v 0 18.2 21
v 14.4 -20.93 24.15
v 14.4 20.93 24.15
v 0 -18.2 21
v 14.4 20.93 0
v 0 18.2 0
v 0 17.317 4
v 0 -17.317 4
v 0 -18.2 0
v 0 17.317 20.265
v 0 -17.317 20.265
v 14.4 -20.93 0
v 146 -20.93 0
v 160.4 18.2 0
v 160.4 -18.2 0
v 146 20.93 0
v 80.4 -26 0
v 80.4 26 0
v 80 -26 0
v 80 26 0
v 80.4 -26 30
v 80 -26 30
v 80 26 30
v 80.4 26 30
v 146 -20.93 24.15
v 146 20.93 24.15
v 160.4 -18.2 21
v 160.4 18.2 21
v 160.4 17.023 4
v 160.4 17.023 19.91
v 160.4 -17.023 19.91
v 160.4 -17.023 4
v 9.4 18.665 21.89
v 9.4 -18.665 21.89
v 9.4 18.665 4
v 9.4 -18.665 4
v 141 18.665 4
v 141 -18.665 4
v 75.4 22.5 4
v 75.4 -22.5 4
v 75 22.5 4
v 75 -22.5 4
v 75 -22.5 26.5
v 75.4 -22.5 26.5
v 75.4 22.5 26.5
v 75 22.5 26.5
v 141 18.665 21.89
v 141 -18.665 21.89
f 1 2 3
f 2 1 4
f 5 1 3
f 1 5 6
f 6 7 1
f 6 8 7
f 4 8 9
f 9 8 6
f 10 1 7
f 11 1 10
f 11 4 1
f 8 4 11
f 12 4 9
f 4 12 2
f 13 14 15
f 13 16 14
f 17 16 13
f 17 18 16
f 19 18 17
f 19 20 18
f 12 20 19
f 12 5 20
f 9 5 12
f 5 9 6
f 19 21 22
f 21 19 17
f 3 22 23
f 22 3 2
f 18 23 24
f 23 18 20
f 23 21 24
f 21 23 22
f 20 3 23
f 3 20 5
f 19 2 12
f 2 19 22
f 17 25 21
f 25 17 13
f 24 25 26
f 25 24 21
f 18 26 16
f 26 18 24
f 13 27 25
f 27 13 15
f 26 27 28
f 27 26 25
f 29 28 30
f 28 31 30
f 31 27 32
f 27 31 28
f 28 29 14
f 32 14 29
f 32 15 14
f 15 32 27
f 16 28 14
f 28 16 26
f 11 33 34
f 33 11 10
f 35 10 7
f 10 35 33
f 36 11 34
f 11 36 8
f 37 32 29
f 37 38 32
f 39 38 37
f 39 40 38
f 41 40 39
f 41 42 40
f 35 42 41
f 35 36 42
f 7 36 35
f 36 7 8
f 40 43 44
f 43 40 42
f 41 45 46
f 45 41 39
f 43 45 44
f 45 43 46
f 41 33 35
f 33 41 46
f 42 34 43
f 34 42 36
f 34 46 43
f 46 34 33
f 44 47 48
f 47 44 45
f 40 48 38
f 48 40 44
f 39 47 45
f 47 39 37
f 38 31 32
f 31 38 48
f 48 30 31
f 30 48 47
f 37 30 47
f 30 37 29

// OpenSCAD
$fn = 32;

// ----------------------------------------------------------------------
// Faired channel: 160 x 52 x 30 mm, 3.5 mm walls, faired ends
// ----------------------------------------------------------------------

// --- parameters (mm) ---
length = 160;             // channel length
width = 52;               // channel width at mid length
height = 30;              // channel height at mid length
wall = 3.5;               // side wall thickness
floor_t = 4;              // floor thickness
end_w = 36.4;             // faired end width
end_h = 21;               // faired end height

difference() {
  union() {
    hull() {
      translate([0, -18.2, 0]) cube([0.4, 36.4, 21]);
      translate([14.4, -20.93, 0]) cube([0.4, 41.86, 24.15]);
    }
    hull() {
      translate([14.4, -20.93, 0]) cube([0.4, 41.86, 24.15]);
      translate([80, -26, 0]) cube([0.4, 52, 30]);
    }
    hull() {
      translate([80, -26, 0]) cube([0.4, 52, 30]);
      translate([145.6, -20.93, 0]) cube([0.4, 41.86, 24.15]);
    }
    hull() {
      translate([145.6, -20.93, 0]) cube([0.4, 41.86, 24.15]);
      translate([160, -18.2, 0]) cube([0.4, 36.4, 21]);
    }
  }
  /* cavity, 5 mm proud of both ends so the ports are cut clean */
  hull() {
    translate([-5, -16.6, 4]) cube([0.4, 33.2, 15.4]);
    translate([9.4, -18.665, 4]) cube([0.4, 37.33, 17.89]);
  }
  hull() {
    translate([9.4, -18.665, 4]) cube([0.4, 37.33, 17.89]);
    translate([75, -22.5, 4]) cube([0.4, 45, 22.5]);
  }
  hull() {
    translate([75, -22.5, 4]) cube([0.4, 45, 22.5]);
    translate([140.6, -18.665, 4]) cube([0.4, 37.33, 17.89]);
  }
  hull() {
    translate([140.6, -18.665, 4]) cube([0.4, 37.33, 17.89]);
    translate([165, -16.6, 4]) cube([0.4, 33.2, 15.4]);
  }
}
